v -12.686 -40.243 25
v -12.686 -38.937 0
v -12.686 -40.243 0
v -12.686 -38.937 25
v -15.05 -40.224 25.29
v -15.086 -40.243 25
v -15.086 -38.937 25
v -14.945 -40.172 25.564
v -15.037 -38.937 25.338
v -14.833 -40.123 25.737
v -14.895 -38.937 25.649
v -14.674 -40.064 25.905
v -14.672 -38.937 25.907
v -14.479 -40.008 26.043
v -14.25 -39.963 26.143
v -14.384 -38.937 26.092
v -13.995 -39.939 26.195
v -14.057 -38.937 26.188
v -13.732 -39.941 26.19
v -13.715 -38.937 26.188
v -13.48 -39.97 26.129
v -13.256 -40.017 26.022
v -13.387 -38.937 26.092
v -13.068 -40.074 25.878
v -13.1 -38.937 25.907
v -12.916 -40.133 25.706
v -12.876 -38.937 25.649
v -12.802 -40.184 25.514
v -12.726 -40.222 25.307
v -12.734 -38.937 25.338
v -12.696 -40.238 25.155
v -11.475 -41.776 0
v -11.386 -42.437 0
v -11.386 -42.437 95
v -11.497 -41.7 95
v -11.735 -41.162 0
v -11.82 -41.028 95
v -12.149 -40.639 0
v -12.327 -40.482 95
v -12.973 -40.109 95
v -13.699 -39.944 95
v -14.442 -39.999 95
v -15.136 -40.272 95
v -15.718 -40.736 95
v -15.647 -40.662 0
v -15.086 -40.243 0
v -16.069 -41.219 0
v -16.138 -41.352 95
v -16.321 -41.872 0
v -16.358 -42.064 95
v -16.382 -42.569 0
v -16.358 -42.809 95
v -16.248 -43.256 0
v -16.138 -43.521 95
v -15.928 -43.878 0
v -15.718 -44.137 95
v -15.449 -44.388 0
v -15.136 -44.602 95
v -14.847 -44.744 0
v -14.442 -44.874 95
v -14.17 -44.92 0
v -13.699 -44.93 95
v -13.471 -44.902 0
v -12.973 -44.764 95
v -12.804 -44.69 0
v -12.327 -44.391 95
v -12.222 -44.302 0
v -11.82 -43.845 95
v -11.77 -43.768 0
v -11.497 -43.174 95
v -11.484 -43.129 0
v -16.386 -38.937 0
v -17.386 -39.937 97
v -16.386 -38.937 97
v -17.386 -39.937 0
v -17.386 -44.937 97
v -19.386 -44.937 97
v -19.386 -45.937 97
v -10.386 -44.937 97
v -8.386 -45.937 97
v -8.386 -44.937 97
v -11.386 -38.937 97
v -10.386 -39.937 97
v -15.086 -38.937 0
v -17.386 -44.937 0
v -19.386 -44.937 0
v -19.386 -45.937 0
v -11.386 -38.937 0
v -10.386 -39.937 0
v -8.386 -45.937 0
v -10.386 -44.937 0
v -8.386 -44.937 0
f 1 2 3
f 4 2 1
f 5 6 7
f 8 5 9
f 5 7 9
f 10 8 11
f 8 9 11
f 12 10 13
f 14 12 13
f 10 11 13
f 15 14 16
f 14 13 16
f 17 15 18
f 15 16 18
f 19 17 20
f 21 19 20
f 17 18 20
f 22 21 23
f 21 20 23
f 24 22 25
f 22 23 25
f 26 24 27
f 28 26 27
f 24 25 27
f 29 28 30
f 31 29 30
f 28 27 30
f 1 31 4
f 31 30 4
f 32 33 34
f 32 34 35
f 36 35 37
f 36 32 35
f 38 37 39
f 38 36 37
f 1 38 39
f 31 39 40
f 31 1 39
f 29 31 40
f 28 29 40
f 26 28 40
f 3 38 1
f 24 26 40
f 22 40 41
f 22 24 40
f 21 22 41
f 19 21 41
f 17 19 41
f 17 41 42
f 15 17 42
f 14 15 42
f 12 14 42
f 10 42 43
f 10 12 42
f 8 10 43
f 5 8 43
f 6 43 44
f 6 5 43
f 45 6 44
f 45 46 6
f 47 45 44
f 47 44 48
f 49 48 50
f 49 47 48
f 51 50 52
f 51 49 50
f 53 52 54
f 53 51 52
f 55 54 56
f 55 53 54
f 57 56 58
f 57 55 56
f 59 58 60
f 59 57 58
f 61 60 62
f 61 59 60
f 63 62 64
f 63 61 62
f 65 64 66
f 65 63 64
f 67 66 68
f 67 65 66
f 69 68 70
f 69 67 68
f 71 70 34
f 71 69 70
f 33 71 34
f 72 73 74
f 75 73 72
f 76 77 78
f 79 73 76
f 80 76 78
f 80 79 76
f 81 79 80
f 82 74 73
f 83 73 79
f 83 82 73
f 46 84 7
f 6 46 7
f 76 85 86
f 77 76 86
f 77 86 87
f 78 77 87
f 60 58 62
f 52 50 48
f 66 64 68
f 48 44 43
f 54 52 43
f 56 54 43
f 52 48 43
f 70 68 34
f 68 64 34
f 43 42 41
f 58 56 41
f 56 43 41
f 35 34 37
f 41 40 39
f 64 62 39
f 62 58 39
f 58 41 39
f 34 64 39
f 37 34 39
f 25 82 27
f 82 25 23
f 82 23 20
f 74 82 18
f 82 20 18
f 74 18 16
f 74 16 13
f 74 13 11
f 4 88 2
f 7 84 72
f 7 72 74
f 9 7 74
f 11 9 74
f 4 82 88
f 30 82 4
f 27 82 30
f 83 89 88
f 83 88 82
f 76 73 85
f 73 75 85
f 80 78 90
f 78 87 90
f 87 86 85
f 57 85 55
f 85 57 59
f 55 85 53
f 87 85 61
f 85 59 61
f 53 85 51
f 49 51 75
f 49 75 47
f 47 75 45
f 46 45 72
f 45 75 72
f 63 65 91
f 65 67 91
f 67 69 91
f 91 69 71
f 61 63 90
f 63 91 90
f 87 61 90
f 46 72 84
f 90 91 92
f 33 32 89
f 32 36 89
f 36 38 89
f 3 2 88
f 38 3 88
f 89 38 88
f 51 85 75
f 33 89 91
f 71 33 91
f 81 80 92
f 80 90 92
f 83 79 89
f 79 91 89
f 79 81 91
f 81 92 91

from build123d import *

# Parameters (mm, degrees)
F0_W     = 2
F0_H     = 1
F0_R     = 2.5
F1_DEPTH = 95
F3_DEPTH = 2
F5_SIZE  = 1
F6_SIZE  = 1
F7_W     = 2.4
F7_H     = 25
F8_DEPTH = 1.3078288801


with BuildPart() as f1:
    # F0 (on Top) → F1 (new body)
    with BuildSketch(Plane.XY):
        with Locations((-18.385866493, -45.4366366267)):
            Rectangle(F0_W, F0_H)
        Polygon((-10.385866493, -38.9366366267), (-17.385866493, -38.9366366267), (-17.385866493, -44.9366366267), (-17.385866493, -45.9366366267), (-10.385866493, -45.9366366267), (-10.385866493, -44.9366366267), align=None)
        with Locations((-13.885866493, -42.4366366267)):
            Circle(F0_R, mode=Mode.SUBTRACT)
        with Locations((-9.385866493, -45.4366366267)):
            Rectangle(F0_W, F0_H)
    extrude(amount=F1_DEPTH)


with BuildPart() as f3:
    # F2 (on face) → F3 (new body)
    with BuildSketch(Plane.XY.offset(95)):
        Polygon((-19.385866493, -44.9366366267), (-19.385866493, -45.9366366267), (-8.385866493, -45.9366366267), (-8.385866493, -44.9366366267), (-10.385866493, -44.9366366267), (-10.385866493, -38.9366366267), (-17.385866493, -38.9366366267), (-17.385866493, -44.9366366267), align=None)
    extrude(amount=F3_DEPTH)


with BuildPart() as f1_1:
    add(f1.part)

    # F4: union F3
    add(f3.part)

    # F5
    f5_edges = [f1_1.edges().sort_by_distance(p)[0] for p in [
        (-10.385866, -38.936637, 48.5),
    ]]
    chamfer(f5_edges, length=F5_SIZE)

    # F6
    f6_edges = [f1_1.edges().sort_by_distance(p)[0] for p in [
        (-17.385866, -38.936637, 48.5),
    ]]
    chamfer(f6_edges, length=F6_SIZE)

    # F7 (on face) → F8 (cut, through all)
    with BuildSketch(Plane(origin=(0, -38.9366366267, 0), x_dir=(-1, 0, 0), z_dir=(0, 1, 0))):
        with Locations((13.885866493, 12.5)):
            Rectangle(F7_W, F7_H)
        with BuildLine():
            ThreePointArc((15.085866493, 25), (13.885866493, 26.2), (12.685866493, 25))
            Line((12.685866493, 25), (15.085866493, 25))
        make_face()
    extrude(amount=-F8_DEPTH, mode=Mode.SUBTRACT)


solid = f1_1.part
